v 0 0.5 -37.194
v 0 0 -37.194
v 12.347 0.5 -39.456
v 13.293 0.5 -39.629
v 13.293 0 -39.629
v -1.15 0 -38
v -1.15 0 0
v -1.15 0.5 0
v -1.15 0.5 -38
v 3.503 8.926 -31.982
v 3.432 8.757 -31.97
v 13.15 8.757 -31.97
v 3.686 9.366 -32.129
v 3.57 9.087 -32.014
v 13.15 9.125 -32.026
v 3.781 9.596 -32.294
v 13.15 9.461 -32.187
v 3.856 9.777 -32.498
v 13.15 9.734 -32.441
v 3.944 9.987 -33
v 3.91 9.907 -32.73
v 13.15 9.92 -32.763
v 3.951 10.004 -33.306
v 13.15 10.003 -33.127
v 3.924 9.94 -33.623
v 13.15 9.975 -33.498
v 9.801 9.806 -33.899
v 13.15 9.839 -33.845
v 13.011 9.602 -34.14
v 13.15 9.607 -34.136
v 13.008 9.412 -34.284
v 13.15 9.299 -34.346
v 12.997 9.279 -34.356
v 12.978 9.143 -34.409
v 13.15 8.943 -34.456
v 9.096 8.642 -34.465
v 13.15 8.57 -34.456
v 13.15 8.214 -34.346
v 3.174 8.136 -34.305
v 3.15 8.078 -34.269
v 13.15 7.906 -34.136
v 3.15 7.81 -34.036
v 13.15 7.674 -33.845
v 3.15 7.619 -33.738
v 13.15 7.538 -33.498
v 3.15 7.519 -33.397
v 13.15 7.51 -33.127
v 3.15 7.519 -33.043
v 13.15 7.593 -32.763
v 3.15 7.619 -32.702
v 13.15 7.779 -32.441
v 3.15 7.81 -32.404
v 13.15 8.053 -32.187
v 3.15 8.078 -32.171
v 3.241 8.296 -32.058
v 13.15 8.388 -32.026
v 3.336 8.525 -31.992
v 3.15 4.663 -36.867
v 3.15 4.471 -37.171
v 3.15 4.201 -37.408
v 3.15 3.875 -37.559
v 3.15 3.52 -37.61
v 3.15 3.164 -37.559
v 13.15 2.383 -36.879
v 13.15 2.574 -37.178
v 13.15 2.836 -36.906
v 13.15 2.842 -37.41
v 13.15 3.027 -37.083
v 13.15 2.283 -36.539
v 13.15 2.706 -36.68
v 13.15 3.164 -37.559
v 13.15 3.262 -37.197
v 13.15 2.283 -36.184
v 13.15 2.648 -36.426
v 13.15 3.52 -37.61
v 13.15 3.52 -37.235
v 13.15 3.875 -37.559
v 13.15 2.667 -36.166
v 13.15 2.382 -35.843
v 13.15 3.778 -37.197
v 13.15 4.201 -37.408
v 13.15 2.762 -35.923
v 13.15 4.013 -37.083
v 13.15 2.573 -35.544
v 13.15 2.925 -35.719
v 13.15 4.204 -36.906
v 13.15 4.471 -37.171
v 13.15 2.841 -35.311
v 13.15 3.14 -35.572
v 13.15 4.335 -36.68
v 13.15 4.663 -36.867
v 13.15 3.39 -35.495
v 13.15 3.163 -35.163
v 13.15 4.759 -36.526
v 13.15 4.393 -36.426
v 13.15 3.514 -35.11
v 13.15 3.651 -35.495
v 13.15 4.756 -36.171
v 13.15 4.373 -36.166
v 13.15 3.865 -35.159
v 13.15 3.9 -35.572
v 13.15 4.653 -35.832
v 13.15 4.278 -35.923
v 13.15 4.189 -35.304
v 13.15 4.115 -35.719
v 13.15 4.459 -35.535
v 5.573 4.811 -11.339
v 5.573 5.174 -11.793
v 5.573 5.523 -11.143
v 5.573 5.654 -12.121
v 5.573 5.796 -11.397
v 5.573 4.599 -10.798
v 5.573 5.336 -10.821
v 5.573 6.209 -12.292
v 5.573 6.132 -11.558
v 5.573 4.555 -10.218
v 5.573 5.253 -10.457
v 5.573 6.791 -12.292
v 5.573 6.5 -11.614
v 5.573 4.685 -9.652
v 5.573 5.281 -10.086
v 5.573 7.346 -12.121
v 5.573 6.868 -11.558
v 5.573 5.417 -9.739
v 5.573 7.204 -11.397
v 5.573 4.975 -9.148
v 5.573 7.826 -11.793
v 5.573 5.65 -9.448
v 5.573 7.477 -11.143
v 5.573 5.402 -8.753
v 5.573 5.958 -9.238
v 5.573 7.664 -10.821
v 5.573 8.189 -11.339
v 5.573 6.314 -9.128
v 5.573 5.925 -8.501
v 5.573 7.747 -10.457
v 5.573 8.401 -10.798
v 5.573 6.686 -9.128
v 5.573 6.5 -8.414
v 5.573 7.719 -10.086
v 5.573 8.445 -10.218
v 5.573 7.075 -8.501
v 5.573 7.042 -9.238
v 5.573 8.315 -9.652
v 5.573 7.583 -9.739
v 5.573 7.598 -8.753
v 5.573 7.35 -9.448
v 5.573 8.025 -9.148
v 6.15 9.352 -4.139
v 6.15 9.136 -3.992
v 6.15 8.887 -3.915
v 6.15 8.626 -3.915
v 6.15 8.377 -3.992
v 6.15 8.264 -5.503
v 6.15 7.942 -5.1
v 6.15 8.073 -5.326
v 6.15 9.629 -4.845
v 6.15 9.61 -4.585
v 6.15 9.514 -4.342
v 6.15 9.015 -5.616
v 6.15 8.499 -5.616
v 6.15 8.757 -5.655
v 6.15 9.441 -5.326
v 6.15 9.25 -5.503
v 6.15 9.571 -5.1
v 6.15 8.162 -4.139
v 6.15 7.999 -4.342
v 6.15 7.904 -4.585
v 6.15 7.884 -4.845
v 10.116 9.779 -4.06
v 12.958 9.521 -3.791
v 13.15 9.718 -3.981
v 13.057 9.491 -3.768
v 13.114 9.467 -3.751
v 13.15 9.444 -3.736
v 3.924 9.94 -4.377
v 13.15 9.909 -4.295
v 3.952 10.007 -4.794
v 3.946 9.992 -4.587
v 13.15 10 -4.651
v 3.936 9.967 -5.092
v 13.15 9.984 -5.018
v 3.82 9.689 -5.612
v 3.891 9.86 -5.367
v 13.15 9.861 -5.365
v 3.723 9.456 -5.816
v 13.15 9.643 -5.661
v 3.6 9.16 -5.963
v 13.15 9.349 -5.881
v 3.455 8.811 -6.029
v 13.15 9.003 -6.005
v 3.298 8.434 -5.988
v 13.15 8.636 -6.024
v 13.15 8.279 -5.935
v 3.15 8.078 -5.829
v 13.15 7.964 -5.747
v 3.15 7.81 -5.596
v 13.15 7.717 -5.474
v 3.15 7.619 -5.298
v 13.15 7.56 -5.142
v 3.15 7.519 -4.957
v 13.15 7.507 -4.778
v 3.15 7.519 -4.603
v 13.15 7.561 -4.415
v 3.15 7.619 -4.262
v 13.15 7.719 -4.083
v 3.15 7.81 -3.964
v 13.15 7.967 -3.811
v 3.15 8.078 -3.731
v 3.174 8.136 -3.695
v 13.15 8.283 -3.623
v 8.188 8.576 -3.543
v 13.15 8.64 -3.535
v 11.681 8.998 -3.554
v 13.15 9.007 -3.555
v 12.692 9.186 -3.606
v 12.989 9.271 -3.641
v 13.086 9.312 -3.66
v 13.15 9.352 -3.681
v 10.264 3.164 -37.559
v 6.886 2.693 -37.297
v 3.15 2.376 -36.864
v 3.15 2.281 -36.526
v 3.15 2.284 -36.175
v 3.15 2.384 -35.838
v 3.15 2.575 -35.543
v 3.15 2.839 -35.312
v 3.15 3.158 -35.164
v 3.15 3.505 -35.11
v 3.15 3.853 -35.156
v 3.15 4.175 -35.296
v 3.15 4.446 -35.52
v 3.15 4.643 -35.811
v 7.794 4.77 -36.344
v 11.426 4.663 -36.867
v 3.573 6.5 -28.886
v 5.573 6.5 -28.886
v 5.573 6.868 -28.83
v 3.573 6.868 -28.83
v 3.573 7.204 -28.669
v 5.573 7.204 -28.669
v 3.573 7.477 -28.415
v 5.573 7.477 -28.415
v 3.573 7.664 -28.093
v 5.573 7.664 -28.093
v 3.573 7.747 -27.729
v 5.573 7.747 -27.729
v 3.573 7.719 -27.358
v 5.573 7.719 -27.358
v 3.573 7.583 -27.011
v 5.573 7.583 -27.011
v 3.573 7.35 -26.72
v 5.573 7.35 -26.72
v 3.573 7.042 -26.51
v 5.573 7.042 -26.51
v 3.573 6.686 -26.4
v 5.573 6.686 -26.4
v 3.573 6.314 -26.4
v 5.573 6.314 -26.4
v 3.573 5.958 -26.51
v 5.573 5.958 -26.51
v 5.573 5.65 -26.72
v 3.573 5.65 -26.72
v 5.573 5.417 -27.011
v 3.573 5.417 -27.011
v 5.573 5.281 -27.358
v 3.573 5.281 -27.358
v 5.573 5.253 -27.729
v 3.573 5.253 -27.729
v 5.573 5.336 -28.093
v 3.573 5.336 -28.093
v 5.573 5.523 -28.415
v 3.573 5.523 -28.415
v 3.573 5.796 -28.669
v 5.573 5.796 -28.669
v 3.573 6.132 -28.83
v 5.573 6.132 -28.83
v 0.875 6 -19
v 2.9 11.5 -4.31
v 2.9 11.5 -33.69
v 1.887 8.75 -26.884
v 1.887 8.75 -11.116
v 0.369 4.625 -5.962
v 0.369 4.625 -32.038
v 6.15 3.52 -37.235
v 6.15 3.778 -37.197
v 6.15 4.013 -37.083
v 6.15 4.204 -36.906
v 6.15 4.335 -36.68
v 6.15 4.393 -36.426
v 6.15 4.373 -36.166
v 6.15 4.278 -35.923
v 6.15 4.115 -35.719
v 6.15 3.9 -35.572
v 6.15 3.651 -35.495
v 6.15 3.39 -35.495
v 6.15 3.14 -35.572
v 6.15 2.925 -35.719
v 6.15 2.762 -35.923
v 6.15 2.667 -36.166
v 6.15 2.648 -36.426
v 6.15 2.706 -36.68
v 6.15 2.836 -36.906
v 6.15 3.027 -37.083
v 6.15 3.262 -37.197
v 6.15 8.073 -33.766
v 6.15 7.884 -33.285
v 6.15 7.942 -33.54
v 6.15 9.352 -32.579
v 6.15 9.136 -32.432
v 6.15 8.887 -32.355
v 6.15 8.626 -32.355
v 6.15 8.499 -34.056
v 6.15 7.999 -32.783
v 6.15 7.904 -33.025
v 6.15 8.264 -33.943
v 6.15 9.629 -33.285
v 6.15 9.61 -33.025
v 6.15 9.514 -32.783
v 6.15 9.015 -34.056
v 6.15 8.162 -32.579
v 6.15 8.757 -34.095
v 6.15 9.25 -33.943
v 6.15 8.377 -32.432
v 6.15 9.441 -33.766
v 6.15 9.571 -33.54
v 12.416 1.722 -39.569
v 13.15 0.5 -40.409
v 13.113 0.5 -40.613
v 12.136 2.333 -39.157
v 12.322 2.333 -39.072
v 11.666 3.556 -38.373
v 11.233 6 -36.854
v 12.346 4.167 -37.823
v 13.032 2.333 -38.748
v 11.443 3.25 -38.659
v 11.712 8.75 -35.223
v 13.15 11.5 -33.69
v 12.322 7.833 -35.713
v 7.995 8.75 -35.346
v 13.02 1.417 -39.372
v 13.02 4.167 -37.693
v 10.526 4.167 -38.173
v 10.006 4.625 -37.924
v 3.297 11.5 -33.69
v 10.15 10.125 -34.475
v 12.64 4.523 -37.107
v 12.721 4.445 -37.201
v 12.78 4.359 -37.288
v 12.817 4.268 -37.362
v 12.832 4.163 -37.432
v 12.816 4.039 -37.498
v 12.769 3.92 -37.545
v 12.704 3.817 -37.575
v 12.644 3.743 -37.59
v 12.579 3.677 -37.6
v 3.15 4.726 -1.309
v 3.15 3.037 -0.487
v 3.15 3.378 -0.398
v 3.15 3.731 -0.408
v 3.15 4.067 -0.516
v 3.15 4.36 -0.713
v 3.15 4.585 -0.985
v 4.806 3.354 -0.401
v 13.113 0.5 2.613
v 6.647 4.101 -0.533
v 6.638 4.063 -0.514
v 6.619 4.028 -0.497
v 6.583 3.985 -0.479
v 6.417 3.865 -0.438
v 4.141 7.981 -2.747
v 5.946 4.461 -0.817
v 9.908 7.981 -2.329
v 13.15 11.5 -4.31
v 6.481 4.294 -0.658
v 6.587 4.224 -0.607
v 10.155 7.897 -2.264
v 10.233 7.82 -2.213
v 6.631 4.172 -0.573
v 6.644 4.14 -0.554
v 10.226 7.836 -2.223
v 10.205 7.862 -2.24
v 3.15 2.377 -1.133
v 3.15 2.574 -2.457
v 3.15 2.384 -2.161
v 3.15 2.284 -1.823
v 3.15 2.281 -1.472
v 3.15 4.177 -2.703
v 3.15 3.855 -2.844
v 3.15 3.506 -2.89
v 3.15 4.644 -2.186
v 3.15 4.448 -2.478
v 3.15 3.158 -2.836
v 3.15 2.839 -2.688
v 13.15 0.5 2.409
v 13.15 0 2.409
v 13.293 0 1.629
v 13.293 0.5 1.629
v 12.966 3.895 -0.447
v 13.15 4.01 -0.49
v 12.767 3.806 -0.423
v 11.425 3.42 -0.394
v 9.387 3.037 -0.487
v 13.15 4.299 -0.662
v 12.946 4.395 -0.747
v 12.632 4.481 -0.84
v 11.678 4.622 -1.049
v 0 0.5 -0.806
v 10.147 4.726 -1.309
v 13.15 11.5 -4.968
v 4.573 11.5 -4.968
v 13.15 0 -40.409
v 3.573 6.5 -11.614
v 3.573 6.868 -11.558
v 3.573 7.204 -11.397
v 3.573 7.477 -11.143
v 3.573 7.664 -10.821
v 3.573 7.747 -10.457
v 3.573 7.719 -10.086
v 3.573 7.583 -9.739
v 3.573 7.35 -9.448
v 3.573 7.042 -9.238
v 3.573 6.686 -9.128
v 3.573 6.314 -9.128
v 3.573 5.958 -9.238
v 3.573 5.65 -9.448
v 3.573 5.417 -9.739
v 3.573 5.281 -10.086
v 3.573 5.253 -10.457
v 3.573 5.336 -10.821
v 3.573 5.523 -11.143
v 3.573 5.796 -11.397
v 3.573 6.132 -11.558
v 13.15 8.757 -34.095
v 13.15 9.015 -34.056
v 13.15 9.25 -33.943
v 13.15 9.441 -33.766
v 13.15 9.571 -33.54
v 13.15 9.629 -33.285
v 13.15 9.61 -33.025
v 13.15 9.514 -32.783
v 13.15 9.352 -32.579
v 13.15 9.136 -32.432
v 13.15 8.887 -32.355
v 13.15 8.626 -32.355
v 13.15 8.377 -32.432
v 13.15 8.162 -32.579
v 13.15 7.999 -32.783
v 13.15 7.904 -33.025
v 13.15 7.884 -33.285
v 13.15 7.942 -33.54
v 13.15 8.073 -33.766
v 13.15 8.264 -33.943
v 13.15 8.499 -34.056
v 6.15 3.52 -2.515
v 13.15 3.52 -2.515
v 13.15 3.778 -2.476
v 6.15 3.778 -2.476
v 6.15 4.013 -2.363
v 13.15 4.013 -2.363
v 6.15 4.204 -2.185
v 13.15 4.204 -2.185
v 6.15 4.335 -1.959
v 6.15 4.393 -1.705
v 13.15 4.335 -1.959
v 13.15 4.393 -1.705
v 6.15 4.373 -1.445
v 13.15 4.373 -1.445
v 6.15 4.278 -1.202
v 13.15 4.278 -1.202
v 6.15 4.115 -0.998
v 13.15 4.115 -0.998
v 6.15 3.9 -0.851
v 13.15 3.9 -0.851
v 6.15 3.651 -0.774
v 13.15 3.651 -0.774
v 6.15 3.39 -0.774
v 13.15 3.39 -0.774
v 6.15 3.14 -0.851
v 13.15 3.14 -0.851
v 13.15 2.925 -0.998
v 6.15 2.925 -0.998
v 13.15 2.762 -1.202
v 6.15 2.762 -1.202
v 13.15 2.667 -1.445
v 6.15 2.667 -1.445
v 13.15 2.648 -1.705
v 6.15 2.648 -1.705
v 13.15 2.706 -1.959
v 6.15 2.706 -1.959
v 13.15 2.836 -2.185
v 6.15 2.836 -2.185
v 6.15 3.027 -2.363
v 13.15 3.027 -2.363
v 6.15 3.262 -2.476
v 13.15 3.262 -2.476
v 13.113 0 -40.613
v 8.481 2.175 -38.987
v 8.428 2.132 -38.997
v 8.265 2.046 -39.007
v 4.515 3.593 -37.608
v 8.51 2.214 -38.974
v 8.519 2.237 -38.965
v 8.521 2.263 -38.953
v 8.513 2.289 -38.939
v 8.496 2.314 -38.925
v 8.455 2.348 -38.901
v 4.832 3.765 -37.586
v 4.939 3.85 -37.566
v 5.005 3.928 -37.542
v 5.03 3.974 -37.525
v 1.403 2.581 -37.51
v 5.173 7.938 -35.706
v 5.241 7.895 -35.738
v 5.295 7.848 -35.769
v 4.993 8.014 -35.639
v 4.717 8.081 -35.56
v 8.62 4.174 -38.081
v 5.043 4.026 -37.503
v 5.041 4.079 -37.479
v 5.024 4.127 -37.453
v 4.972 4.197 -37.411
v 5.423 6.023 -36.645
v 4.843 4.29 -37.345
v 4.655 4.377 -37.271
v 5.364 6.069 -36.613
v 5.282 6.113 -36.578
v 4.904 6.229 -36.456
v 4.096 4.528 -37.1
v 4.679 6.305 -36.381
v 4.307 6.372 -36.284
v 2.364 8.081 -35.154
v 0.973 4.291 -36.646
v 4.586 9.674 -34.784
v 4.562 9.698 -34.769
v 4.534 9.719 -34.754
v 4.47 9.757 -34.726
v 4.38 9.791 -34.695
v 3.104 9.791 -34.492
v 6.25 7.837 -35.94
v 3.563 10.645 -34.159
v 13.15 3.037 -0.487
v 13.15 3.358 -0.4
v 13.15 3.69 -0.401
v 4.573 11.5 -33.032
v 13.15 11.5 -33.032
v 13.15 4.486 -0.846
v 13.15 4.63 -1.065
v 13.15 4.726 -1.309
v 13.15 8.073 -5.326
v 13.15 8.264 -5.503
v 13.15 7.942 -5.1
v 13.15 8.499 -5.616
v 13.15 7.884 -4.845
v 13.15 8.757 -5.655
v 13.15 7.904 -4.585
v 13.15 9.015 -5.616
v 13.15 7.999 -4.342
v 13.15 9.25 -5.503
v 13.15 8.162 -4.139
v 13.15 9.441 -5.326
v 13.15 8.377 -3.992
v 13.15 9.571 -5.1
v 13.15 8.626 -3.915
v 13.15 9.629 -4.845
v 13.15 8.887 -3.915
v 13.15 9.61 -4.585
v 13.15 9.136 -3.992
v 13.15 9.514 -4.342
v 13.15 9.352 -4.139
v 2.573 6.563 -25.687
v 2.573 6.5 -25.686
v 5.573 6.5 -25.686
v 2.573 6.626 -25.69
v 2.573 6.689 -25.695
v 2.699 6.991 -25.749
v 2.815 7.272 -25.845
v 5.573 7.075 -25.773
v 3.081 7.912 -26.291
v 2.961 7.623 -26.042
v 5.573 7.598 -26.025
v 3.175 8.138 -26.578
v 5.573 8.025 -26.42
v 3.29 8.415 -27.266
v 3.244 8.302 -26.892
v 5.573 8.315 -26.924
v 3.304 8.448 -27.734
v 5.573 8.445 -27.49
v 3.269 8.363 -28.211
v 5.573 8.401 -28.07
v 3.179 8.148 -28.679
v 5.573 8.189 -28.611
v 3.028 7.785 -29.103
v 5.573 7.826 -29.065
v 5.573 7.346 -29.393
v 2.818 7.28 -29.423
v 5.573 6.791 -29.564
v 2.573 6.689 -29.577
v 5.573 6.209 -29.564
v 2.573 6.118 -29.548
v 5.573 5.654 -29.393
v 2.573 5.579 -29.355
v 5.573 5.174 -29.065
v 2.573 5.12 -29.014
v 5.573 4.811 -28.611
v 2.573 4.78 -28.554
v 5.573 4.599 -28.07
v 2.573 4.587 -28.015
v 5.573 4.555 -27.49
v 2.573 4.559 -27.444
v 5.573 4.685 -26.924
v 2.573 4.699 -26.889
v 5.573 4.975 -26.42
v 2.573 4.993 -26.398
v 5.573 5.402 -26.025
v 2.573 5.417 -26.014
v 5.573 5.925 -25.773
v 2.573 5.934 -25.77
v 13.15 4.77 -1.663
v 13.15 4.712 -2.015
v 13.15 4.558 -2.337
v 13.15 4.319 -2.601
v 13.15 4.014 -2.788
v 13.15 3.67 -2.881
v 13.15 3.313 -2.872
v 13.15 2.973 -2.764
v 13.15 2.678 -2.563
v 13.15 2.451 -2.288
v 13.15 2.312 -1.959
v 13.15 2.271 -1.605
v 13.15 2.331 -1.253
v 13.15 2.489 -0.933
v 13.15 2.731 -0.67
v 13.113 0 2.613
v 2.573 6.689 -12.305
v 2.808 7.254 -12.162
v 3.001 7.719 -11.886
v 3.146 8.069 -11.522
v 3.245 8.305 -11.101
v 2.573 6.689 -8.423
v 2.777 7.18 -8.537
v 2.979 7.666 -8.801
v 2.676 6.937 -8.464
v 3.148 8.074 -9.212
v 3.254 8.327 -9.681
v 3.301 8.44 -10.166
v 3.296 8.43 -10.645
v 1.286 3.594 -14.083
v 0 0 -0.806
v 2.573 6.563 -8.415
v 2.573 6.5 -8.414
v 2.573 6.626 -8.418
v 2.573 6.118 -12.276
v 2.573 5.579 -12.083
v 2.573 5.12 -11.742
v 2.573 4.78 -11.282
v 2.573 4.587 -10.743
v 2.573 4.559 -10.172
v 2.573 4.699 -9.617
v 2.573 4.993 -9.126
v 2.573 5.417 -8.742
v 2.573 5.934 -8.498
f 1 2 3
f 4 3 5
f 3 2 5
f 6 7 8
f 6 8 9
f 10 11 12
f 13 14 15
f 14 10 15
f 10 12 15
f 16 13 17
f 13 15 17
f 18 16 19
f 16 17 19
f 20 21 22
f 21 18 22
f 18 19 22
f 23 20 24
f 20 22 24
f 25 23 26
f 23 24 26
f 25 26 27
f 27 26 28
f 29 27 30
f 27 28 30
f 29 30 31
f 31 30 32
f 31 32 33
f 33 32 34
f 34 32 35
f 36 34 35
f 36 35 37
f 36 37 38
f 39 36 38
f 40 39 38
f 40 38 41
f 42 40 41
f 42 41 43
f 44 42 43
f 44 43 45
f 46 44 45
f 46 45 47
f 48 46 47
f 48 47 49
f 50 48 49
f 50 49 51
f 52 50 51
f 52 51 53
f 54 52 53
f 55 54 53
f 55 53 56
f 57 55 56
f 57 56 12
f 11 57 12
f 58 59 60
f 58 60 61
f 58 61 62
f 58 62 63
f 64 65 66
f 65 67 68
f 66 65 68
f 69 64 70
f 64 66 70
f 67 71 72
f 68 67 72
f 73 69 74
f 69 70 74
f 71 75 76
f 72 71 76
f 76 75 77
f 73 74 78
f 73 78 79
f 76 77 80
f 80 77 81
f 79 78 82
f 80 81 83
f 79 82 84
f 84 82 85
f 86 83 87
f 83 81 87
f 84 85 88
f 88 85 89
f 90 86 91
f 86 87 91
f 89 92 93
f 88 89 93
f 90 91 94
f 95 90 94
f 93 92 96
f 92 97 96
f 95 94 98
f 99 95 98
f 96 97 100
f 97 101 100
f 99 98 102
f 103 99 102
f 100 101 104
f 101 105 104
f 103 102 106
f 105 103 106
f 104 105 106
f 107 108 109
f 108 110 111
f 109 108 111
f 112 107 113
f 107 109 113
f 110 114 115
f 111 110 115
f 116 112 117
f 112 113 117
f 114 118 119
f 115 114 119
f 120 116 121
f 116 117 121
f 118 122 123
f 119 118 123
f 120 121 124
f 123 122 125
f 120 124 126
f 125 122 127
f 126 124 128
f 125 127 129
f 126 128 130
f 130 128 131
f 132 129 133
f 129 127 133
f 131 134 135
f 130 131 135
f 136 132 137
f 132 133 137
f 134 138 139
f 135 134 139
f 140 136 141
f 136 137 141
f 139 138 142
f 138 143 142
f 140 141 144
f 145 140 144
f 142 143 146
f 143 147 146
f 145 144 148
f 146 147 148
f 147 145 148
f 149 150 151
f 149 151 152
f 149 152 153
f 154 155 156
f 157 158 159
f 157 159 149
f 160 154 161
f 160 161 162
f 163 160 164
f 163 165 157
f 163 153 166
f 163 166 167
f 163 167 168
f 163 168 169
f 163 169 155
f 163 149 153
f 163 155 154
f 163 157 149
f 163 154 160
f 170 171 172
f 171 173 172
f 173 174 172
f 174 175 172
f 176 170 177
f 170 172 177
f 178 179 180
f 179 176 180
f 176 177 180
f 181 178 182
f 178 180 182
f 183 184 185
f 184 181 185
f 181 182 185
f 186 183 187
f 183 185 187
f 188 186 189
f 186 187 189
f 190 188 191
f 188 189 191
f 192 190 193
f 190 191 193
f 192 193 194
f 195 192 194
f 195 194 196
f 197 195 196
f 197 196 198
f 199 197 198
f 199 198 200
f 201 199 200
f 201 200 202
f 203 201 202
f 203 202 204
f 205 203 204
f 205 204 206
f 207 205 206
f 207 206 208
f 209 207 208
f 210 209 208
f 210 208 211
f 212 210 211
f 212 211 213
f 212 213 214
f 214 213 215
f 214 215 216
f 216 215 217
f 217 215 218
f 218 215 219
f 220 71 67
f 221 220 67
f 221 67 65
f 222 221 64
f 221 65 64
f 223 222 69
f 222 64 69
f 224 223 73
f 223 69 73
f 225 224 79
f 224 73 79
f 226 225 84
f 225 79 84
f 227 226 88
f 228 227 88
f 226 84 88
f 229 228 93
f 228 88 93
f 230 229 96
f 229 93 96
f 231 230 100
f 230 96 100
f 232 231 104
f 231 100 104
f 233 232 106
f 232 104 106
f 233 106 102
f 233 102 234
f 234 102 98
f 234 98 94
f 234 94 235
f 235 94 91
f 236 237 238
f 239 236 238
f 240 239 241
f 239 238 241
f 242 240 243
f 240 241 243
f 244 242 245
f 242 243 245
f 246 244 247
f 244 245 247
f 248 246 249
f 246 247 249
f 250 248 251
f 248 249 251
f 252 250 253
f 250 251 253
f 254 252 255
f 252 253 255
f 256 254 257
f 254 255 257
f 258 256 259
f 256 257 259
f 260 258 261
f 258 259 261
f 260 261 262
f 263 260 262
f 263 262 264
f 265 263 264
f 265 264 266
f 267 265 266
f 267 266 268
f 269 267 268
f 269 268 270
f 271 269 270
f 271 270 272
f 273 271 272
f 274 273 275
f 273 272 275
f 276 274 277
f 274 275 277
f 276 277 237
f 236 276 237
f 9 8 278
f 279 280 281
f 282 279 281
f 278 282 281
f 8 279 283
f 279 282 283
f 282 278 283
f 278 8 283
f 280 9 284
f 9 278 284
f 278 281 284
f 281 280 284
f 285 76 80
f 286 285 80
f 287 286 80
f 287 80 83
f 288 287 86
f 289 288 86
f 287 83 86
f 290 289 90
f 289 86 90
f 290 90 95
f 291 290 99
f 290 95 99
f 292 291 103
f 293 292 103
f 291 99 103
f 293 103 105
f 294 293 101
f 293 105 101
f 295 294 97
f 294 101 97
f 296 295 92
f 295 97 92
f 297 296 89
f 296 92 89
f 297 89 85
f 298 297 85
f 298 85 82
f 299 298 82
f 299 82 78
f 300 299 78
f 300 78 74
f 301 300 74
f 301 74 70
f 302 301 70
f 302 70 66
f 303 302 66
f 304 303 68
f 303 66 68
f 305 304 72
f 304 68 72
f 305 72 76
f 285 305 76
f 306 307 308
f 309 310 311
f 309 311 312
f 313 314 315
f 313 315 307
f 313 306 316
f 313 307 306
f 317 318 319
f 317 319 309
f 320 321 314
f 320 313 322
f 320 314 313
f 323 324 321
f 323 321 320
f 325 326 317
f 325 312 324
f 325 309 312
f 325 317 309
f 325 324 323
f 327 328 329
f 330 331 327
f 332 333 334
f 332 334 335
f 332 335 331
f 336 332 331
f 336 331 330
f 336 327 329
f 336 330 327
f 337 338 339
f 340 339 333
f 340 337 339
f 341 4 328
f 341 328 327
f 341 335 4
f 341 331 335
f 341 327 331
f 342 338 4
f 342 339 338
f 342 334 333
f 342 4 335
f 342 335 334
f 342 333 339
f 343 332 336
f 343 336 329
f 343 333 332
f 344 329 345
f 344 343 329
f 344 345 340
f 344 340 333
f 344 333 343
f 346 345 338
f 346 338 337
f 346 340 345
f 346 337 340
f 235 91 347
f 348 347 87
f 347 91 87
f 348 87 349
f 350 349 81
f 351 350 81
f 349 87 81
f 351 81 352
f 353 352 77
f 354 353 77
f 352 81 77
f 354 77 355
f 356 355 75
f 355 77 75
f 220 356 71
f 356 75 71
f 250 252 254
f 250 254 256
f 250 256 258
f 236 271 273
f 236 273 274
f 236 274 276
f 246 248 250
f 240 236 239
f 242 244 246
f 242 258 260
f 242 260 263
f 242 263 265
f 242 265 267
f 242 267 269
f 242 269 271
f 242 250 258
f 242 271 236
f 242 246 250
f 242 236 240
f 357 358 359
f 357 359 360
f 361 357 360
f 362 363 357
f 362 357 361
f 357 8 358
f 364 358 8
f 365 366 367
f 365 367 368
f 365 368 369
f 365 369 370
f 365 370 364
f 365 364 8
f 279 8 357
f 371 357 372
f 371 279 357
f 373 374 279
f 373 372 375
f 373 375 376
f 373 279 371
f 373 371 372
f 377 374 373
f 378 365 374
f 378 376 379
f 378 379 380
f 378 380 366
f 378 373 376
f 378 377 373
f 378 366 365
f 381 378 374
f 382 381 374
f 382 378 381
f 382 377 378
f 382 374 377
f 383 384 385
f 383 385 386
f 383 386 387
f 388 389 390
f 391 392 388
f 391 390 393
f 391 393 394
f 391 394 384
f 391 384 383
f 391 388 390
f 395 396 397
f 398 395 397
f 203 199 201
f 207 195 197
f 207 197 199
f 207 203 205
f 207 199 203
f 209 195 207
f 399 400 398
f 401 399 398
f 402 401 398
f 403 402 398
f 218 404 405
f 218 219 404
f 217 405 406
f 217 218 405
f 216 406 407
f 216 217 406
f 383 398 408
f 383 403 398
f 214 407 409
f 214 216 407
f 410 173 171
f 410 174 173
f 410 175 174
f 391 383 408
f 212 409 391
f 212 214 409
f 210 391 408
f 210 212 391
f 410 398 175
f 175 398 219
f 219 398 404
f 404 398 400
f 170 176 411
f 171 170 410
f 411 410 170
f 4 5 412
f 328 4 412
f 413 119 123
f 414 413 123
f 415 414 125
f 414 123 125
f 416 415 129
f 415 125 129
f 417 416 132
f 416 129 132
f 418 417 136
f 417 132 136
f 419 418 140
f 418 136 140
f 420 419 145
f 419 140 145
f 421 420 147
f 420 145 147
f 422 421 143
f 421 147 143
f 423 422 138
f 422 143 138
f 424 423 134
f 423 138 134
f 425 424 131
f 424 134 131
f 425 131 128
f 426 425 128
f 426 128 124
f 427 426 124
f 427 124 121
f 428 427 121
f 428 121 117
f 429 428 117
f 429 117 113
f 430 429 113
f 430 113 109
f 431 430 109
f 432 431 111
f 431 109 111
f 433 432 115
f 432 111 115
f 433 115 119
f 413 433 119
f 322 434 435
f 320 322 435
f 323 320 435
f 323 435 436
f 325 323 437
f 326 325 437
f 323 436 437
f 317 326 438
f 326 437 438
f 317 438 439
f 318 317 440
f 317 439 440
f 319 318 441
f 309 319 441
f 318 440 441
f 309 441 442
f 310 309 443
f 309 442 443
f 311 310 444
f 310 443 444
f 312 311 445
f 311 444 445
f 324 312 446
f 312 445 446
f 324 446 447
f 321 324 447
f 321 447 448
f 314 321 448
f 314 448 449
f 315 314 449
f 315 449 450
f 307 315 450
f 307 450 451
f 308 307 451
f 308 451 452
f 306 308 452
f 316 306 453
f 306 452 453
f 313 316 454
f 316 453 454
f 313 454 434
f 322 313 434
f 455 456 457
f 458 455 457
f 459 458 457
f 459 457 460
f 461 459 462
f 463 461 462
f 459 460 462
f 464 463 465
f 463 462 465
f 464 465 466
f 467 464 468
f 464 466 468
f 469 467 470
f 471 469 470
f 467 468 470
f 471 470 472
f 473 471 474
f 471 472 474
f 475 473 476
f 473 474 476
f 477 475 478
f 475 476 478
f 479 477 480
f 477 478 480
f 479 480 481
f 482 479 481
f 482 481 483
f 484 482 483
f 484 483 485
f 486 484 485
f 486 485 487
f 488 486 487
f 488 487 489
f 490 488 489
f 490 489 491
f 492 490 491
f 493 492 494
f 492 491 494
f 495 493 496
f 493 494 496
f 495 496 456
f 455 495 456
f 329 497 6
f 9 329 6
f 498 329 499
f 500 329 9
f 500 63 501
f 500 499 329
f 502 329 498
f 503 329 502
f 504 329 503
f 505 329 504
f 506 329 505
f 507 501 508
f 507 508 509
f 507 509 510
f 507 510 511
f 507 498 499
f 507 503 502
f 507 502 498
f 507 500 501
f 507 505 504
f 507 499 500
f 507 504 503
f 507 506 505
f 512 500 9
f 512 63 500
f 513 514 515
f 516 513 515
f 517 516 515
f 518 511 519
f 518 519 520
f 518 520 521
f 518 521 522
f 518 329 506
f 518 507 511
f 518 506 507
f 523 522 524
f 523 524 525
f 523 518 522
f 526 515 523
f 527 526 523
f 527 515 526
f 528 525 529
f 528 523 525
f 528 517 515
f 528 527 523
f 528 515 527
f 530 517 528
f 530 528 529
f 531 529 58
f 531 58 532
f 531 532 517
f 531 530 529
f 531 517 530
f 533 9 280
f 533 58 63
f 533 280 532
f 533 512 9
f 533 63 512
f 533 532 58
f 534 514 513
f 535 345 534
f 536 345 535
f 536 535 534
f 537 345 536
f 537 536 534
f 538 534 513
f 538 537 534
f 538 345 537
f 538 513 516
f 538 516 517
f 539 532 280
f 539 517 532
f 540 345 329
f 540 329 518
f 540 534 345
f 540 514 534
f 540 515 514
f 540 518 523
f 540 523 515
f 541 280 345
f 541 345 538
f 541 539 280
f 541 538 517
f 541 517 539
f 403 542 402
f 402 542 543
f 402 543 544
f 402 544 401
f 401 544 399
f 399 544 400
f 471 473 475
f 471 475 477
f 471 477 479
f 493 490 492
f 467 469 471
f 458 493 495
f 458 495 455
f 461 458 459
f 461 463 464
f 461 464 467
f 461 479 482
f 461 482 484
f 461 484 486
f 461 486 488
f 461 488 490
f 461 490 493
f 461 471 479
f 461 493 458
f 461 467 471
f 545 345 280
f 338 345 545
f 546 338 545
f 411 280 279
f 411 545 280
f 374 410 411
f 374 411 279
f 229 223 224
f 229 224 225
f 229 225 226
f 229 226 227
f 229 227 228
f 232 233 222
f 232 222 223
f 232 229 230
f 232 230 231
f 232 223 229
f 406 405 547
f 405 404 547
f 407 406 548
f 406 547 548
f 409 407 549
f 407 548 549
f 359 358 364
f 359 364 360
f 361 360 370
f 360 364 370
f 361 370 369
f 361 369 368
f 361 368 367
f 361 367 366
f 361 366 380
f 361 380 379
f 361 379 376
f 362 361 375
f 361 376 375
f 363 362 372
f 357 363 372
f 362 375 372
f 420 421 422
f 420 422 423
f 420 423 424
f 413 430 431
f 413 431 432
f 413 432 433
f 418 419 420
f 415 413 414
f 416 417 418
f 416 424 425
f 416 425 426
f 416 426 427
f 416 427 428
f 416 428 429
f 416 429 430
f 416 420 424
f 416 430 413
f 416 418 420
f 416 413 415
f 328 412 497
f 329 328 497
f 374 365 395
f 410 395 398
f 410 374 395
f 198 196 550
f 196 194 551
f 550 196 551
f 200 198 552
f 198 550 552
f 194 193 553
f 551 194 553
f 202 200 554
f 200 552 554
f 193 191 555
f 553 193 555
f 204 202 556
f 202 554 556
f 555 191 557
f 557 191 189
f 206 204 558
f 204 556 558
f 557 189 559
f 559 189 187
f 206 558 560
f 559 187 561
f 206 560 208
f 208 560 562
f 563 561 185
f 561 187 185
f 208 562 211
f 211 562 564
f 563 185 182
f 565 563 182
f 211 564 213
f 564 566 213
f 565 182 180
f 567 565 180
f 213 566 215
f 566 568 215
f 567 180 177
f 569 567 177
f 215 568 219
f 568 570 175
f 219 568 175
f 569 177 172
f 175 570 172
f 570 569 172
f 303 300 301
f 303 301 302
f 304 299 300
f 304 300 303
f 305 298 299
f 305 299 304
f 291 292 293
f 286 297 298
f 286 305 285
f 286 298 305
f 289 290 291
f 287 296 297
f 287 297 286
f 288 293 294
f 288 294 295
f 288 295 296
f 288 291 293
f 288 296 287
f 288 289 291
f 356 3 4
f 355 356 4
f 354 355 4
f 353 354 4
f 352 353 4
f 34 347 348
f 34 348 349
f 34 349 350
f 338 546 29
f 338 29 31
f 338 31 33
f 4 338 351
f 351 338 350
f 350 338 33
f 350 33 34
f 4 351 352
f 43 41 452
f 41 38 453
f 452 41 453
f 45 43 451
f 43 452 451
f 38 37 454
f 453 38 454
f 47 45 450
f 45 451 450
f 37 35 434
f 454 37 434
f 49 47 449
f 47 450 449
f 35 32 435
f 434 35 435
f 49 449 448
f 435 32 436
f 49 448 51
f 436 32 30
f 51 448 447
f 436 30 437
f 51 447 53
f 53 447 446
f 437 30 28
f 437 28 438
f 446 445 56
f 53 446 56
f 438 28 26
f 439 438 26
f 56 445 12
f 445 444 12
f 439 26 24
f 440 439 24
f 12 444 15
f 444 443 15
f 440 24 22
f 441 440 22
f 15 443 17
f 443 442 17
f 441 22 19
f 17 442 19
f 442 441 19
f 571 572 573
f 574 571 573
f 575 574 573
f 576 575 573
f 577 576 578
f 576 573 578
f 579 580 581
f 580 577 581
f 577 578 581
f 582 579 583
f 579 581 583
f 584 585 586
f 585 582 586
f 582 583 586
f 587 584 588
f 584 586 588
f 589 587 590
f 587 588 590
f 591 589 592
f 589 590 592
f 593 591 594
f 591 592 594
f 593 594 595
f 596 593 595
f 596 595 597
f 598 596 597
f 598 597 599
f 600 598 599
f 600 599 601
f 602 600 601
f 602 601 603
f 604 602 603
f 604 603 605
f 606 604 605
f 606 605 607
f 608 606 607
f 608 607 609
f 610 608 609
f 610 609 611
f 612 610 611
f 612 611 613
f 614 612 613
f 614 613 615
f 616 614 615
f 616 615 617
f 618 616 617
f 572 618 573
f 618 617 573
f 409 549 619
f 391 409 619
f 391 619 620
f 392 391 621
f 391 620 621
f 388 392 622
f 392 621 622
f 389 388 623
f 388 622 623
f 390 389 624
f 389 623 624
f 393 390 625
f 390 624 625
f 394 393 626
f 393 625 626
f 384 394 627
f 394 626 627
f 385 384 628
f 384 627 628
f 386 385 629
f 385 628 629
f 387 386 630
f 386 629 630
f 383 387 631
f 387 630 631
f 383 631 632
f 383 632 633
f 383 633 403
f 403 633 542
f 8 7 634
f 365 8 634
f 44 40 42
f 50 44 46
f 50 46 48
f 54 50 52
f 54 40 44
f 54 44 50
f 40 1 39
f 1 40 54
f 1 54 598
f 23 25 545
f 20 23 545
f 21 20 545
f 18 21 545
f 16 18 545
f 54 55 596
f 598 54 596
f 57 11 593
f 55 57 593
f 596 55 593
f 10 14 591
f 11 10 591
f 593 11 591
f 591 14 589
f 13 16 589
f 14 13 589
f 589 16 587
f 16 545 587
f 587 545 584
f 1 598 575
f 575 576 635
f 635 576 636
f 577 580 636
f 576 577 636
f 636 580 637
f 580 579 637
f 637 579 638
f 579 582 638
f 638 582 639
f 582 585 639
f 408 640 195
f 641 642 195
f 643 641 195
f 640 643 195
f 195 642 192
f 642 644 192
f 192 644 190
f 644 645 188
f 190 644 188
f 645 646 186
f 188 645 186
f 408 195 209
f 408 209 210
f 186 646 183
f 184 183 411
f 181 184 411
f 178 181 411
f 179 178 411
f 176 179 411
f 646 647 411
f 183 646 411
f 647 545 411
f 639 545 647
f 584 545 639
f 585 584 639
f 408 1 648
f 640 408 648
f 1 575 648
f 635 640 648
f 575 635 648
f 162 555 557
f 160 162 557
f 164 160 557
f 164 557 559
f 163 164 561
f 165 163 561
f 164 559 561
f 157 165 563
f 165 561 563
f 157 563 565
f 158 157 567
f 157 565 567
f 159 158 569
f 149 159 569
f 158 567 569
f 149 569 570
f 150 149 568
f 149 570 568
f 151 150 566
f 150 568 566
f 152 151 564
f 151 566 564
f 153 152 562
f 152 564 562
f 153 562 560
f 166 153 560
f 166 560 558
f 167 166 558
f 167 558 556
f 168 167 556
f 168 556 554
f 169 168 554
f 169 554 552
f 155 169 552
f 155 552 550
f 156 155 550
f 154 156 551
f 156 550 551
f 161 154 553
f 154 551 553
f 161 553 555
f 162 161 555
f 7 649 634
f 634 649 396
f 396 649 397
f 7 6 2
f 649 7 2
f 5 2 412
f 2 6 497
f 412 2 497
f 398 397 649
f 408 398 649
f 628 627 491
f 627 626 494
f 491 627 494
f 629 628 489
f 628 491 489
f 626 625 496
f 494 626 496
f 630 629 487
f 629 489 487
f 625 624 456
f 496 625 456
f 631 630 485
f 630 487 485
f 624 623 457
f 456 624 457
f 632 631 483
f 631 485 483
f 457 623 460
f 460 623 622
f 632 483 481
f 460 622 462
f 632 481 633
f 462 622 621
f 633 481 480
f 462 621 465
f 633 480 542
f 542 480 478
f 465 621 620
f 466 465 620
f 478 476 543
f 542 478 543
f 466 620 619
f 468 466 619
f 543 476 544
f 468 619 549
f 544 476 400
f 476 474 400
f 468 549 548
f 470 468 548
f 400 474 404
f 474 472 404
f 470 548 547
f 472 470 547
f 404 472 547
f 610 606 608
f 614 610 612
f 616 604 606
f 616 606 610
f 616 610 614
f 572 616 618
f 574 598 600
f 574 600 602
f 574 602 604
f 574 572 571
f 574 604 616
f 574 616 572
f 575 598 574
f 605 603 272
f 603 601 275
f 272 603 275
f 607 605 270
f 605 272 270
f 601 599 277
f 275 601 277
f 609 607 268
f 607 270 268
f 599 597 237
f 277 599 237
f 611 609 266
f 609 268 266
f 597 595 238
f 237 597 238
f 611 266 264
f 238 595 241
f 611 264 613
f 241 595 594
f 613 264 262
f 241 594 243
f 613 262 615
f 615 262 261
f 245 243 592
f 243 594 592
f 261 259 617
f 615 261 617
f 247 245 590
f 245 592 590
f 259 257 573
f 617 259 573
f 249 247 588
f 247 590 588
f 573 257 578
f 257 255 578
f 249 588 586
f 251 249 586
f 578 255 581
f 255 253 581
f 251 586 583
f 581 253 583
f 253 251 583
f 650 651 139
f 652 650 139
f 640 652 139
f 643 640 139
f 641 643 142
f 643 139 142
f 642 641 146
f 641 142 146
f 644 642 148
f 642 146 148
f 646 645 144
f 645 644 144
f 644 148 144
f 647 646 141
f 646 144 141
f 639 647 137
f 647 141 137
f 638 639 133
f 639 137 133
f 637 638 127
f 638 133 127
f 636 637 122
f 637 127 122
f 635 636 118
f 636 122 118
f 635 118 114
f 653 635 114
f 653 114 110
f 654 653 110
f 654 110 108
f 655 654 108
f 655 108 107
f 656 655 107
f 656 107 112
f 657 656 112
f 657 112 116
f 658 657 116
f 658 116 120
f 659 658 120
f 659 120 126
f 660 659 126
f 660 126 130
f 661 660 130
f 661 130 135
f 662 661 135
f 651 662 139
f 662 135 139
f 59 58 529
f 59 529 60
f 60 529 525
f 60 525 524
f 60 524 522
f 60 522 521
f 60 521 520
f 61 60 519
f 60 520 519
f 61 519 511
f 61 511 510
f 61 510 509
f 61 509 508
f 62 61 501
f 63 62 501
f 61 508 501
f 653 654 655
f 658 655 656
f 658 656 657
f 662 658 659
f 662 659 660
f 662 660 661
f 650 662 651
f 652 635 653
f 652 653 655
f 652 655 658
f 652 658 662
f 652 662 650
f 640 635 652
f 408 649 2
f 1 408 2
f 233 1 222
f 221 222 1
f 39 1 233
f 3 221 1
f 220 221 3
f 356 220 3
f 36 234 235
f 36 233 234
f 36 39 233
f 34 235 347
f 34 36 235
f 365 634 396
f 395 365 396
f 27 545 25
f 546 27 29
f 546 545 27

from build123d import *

# Parameters (mm, degrees)
SKETCH1_W                = 1.15
SKETCH1_H                = 38
BOSS_EXTRUDE1_DEPTH      = 0.5
BOSS_EXTRUDE2_OUTLINE_R  = 1.25
BOSS_EXTRUDE2_DEPTH      = 10
SKETCH6_R                = 0.875
CUT_EXTRUDE1_DEPTH       = 7
BOSS_EXTRUDE4_DEPTH      = 2
BOSS_EXTRUDE4_DEPTH_BACK = 1
SKETCH8_R                = 1.95
SKETCH9_R                = 1.25
CUT_EXTRUDE2_DEPTH       = 2


with BuildPart() as part:
    # Sketch1 → Boss-Extrude1 (new body)
    with BuildSketch(Plane(origin=(0, 0, 0), x_dir=(1, 0, 0), z_dir=(0, 1, 0))):
        with Locations((-0.575, 19)):
            Rectangle(SKETCH1_W, SKETCH1_H)
        Polygon((13.112661273, 40.612755906), (-1.15, 38), (0, 38), (0, 37.194026242), (13.292851335, 39.629124094), (13.15, 40.408929127), align=None)
        Polygon((0, 0), (-1.15, 0), (13.112661273, -2.612755906), (13.15, -2.408929127), (13.292851335, -1.629124094), (0, 0.805973758), align=None)
    extrude(amount=BOSS_EXTRUDE1_DEPTH)

    # Loft5: read off the stored shape, not the designer's step
    # Loft5: loft between two sections, ruled curve by curve
    loft5_from = [
        Edge.make_bspline([(0, 0.5, -37.194026242), (2.057778489, 0.5, -37.570987652), (4.115556979, 0.5, -37.947949061), (8.231113957, 0.5, -38.701871881), (10.288892446, 0.5, -39.078833291), (12.346670936, 0.5, -39.4557947)], [0, 0, 0, 0, 0.5, 0.5, 1, 1, 1, 1], 3),
        Edge.make_bspline([(12.346670936, 0.5, -39.4557947), (12.504367669, 0.5, -39.484682933), (12.662064402, 0.5, -39.513571165), (12.977457869, 0.5, -39.571347629), (13.135154602, 0.5, -39.600235862), (13.292851335, 0.5, -39.629124094)], [0, 0, 0, 0, 0.5, 0.5, 1, 1, 1, 1], 3),
        Edge.make_bspline([(13.292851335, 0.5, -39.629124094), (13.262819658, 0.5, -39.793062729), (13.232787981, 0.5, -39.957001365), (13.172724627, 0.5, -40.284878635), (13.14269295, 0.5, -40.44881727), (13.112661273, 0.5, -40.612755906)], [0, 0, 0, 0, 0.5, 0.5, 1, 1, 1, 1], 3),
        Edge.make_bspline([(13.112661273, 0.5, -40.612755906), (10.73555106, 0.5, -40.177296588), (8.358440848, 0.5, -39.741837271), (3.604220424, 0.5, -38.870918635), (1.227110212, 0.5, -38.435459318), (-1.15, 0.5, -38)], [0, 0, 0, 0, 0.5, 0.5, 1, 1, 1, 1], 3),
        Edge.make_bspline([(-1.15, 0.5, 0), (1.227110212, 0.5, 0.435459318), (3.604220424, 0.5, 0.870918635), (8.358440848, 0.5, 1.741837271), (10.73555106, 0.5, 2.177296588), (13.112661273, 0.5, 2.612755906)], [0, 0, 0, 0, 0.5, 0.5, 1, 1, 1, 1], 3),
        Edge.make_bspline([(13.112661273, 0.5, 2.612755906), (13.14269295, 0.5, 2.44881727), (13.172724627, 0.5, 2.284878635), (13.232787981, 0.5, 1.957001365), (13.262819658, 0.5, 1.793062729), (13.292851335, 0.5, 1.629124094)], [0, 0, 0, 0, 0.5, 0.5, 1, 1, 1, 1], 3),
        Edge.make_bspline([(13.292851335, 0.5, 1.629124094), (11.077376113, 0.5, 1.223274452), (8.86190089, 0.5, 0.81742481), (4.430950445, 0.5, 0.005725526), (2.215475223, 0.5, -0.400124116), (0, 0.5, -0.805973758)], [0, 0, 0, 0, 0.5, 0.5, 1, 1, 1, 1], 3),
        Edge.make_line((0, 0.5, -37.194026242), (0, 0.5, -0.805973758)),
        Edge.make_line((-1.15, 0.5, 0), (-1.15, 0.5, -38)),
    ]
    loft5_to = [
        Edge.make_bspline([(4.572715179, 11.5, -33.032352977), (6.002262649, 11.5, -33.032352977), (7.431810119, 11.5, -33.032352977), (10.29090506, 11.5, -33.032352977), (11.72045253, 11.5, -33.032352977), (13.15, 11.5, -33.032352977)], [0, 0, 0, 0, 0.5, 0.5, 1, 1, 1, 1], 3),
        Edge.make_bspline([(13.15, 11.5, -33.032352977), (13.15, 11.5, -33.141905569), (13.15, 11.5, -33.25145816), (13.15, 11.5, -33.470563343), (13.15, 11.5, -33.580115935), (13.15, 11.5, -33.689668526)], [0, 0, 0, 0, 0.5, 0.5, 1, 1, 1, 1], 3),
        Edge.make_bspline([(13.15, 11.5, -33.689668526), (11.507846202, 11.5, -33.689668526), (9.865692404, 11.5, -33.689668526), (6.581384807, 11.5, -33.689668526), (4.939231009, 11.5, -33.689668526), (3.297077211, 11.5, -33.689668526)], [0, 0, 0, 0, 0.5, 0.5, 1, 1, 1, 1], 3),
        Edge.make_bspline([(3.297077211, 11.5, -33.689668526), (3.230897676, 11.5, -33.689668526), (3.16471814, 11.5, -33.689668526), (3.03235907, 11.5, -33.689668526), (2.966179535, 11.5, -33.689668526), (2.9, 11.5, -33.689668526)], [0, 0, 0, 0, 0.5, 0.5, 1, 1, 1, 1], 3),
        Edge.make_bspline([(2.9, 11.5, -4.310331474), (4.608333333, 11.5, -4.310331474), (6.316666667, 11.5, -4.310331474), (9.733333333, 11.5, -4.310331474), (11.441666667, 11.5, -4.310331474), (13.15, 11.5, -4.310331474)], [0, 0, 0, 0, 0.5, 0.5, 1, 1, 1, 1], 3),
        Edge.make_bspline([(13.15, 11.5, -4.310331474), (13.15, 11.5, -4.419884065), (13.15, 11.5, -4.529436657), (13.15, 11.5, -4.74854184), (13.15, 11.5, -4.858094431), (13.15, 11.5, -4.967647023)], [0, 0, 0, 0, 0.5, 0.5, 1, 1, 1, 1], 3),
        Edge.make_bspline([(13.15, 11.5, -4.967647023), (11.72045253, 11.5, -4.967647023), (10.29090506, 11.5, -4.967647023), (7.431810119, 11.5, -4.967647023), (6.002262649, 11.5, -4.967647023), (4.572715179, 11.5, -4.967647023)], [0, 0, 0, 0, 0.5, 0.5, 1, 1, 1, 1], 3),
        Edge.make_line((4.572715179, 11.5, -33.032352977), (4.572715179, 11.5, -4.967647023)),
        Edge.make_line((2.9, 11.5, -4.310331474), (2.9, 11.5, -33.689668526)),
    ]
    loft5 = Solid(Shell([*[Face.make_surface_from_curves(loft5_from[k], loft5_to[k]) for k in range(9)], Face(Wire(loft5_from)), Face(Wire(loft5_to))]))
    add(loft5)

    # Boss-Extrude2: read off the stored shape, not the designer's step
    # Boss-Extrude2 outline → Boss-Extrude2 (add)
    with BuildSketch(Plane.ZY.offset(-13.15)):
        with BuildLine():
            ThreePointArc((-3.735927195, 9.443986427), (-5.852578834, 8.114733735), (-3.680886419, 9.35202066))
            Line((-3.680886419, 9.35202066), (-3.706433646, 9.399184465))
            Line((-3.706433646, 9.399184465), (-3.735927195, 9.443986427))
        make_face()
        with BuildLine():
            ThreePointArc((-0.486782416, 3.036937924), (-0.515675127, 4.067172643), (-1.308645245, 4.725516594))
            ThreePointArc((-1.308645245, 4.725516594), (-2.763557459, 2.973086258), (-0.486782416, 3.036937924))
        make_face()
        with BuildLine():
            ThreePointArc((-37.558660337, 3.164273978), (-35.225355296, 2.99647832), (-36.867350368, 4.66270759))
            ThreePointArc((-36.867350368, 4.66270759), (-37.495412118, 4.043780582), (-37.558660337, 3.164273978))
        make_face()
        with Locations((-33.220000244, 8.756663732)):
            Circle(BOSS_EXTRUDE2_OUTLINE_R)
    extrude(amount=BOSS_EXTRUDE2_DEPTH)

    # Sketch6 → Cut-Extrude1 (cut)
    with BuildSketch(Plane(origin=(13.15, 0, 0), x_dir=(0, 0, -1), z_dir=(1, 0, 0))):
        with Locations((4.779999756, 8.756663732)):
            Circle(SKETCH6_R)
        with Locations((1.639616293, 3.520129451)):
            Circle(SKETCH6_R)
        with Locations((33.220000244, 8.756663732)):
            Circle(SKETCH6_R)
        with Locations((36.360383707, 3.520129451)):
            Circle(SKETCH6_R)
    extrude(amount=-CUT_EXTRUDE1_DEPTH, mode=Mode.SUBTRACT)

    # Sketch8 → Boss-Extrude4 (add, two sides: drawn at the far end of the back side and taken through both)
    with BuildSketch(Plane.ZY.offset(-4.572715179).offset(-BOSS_EXTRUDE4_DEPTH_BACK)):
        with Locations((-10.364, 6.5)):
            Circle(SKETCH8_R)
        with Locations((-27.636, 6.5)):
            Circle(SKETCH8_R)
    extrude(amount=BOSS_EXTRUDE4_DEPTH + BOSS_EXTRUDE4_DEPTH_BACK)

    # Sketch9 → Cut-Extrude2 (cut)
    with BuildSketch(Plane(origin=(5.572715179, 0, 0), x_dir=(0, 0, -1), z_dir=(1, 0, 0))):
        with Locations((10.364, 6.5)):
            Circle(SKETCH9_R)
        with Locations((27.636, 6.5)):
            Circle(SKETCH9_R)
    extrude(amount=-CUT_EXTRUDE2_DEPTH, mode=Mode.SUBTRACT)


solid = part.part
